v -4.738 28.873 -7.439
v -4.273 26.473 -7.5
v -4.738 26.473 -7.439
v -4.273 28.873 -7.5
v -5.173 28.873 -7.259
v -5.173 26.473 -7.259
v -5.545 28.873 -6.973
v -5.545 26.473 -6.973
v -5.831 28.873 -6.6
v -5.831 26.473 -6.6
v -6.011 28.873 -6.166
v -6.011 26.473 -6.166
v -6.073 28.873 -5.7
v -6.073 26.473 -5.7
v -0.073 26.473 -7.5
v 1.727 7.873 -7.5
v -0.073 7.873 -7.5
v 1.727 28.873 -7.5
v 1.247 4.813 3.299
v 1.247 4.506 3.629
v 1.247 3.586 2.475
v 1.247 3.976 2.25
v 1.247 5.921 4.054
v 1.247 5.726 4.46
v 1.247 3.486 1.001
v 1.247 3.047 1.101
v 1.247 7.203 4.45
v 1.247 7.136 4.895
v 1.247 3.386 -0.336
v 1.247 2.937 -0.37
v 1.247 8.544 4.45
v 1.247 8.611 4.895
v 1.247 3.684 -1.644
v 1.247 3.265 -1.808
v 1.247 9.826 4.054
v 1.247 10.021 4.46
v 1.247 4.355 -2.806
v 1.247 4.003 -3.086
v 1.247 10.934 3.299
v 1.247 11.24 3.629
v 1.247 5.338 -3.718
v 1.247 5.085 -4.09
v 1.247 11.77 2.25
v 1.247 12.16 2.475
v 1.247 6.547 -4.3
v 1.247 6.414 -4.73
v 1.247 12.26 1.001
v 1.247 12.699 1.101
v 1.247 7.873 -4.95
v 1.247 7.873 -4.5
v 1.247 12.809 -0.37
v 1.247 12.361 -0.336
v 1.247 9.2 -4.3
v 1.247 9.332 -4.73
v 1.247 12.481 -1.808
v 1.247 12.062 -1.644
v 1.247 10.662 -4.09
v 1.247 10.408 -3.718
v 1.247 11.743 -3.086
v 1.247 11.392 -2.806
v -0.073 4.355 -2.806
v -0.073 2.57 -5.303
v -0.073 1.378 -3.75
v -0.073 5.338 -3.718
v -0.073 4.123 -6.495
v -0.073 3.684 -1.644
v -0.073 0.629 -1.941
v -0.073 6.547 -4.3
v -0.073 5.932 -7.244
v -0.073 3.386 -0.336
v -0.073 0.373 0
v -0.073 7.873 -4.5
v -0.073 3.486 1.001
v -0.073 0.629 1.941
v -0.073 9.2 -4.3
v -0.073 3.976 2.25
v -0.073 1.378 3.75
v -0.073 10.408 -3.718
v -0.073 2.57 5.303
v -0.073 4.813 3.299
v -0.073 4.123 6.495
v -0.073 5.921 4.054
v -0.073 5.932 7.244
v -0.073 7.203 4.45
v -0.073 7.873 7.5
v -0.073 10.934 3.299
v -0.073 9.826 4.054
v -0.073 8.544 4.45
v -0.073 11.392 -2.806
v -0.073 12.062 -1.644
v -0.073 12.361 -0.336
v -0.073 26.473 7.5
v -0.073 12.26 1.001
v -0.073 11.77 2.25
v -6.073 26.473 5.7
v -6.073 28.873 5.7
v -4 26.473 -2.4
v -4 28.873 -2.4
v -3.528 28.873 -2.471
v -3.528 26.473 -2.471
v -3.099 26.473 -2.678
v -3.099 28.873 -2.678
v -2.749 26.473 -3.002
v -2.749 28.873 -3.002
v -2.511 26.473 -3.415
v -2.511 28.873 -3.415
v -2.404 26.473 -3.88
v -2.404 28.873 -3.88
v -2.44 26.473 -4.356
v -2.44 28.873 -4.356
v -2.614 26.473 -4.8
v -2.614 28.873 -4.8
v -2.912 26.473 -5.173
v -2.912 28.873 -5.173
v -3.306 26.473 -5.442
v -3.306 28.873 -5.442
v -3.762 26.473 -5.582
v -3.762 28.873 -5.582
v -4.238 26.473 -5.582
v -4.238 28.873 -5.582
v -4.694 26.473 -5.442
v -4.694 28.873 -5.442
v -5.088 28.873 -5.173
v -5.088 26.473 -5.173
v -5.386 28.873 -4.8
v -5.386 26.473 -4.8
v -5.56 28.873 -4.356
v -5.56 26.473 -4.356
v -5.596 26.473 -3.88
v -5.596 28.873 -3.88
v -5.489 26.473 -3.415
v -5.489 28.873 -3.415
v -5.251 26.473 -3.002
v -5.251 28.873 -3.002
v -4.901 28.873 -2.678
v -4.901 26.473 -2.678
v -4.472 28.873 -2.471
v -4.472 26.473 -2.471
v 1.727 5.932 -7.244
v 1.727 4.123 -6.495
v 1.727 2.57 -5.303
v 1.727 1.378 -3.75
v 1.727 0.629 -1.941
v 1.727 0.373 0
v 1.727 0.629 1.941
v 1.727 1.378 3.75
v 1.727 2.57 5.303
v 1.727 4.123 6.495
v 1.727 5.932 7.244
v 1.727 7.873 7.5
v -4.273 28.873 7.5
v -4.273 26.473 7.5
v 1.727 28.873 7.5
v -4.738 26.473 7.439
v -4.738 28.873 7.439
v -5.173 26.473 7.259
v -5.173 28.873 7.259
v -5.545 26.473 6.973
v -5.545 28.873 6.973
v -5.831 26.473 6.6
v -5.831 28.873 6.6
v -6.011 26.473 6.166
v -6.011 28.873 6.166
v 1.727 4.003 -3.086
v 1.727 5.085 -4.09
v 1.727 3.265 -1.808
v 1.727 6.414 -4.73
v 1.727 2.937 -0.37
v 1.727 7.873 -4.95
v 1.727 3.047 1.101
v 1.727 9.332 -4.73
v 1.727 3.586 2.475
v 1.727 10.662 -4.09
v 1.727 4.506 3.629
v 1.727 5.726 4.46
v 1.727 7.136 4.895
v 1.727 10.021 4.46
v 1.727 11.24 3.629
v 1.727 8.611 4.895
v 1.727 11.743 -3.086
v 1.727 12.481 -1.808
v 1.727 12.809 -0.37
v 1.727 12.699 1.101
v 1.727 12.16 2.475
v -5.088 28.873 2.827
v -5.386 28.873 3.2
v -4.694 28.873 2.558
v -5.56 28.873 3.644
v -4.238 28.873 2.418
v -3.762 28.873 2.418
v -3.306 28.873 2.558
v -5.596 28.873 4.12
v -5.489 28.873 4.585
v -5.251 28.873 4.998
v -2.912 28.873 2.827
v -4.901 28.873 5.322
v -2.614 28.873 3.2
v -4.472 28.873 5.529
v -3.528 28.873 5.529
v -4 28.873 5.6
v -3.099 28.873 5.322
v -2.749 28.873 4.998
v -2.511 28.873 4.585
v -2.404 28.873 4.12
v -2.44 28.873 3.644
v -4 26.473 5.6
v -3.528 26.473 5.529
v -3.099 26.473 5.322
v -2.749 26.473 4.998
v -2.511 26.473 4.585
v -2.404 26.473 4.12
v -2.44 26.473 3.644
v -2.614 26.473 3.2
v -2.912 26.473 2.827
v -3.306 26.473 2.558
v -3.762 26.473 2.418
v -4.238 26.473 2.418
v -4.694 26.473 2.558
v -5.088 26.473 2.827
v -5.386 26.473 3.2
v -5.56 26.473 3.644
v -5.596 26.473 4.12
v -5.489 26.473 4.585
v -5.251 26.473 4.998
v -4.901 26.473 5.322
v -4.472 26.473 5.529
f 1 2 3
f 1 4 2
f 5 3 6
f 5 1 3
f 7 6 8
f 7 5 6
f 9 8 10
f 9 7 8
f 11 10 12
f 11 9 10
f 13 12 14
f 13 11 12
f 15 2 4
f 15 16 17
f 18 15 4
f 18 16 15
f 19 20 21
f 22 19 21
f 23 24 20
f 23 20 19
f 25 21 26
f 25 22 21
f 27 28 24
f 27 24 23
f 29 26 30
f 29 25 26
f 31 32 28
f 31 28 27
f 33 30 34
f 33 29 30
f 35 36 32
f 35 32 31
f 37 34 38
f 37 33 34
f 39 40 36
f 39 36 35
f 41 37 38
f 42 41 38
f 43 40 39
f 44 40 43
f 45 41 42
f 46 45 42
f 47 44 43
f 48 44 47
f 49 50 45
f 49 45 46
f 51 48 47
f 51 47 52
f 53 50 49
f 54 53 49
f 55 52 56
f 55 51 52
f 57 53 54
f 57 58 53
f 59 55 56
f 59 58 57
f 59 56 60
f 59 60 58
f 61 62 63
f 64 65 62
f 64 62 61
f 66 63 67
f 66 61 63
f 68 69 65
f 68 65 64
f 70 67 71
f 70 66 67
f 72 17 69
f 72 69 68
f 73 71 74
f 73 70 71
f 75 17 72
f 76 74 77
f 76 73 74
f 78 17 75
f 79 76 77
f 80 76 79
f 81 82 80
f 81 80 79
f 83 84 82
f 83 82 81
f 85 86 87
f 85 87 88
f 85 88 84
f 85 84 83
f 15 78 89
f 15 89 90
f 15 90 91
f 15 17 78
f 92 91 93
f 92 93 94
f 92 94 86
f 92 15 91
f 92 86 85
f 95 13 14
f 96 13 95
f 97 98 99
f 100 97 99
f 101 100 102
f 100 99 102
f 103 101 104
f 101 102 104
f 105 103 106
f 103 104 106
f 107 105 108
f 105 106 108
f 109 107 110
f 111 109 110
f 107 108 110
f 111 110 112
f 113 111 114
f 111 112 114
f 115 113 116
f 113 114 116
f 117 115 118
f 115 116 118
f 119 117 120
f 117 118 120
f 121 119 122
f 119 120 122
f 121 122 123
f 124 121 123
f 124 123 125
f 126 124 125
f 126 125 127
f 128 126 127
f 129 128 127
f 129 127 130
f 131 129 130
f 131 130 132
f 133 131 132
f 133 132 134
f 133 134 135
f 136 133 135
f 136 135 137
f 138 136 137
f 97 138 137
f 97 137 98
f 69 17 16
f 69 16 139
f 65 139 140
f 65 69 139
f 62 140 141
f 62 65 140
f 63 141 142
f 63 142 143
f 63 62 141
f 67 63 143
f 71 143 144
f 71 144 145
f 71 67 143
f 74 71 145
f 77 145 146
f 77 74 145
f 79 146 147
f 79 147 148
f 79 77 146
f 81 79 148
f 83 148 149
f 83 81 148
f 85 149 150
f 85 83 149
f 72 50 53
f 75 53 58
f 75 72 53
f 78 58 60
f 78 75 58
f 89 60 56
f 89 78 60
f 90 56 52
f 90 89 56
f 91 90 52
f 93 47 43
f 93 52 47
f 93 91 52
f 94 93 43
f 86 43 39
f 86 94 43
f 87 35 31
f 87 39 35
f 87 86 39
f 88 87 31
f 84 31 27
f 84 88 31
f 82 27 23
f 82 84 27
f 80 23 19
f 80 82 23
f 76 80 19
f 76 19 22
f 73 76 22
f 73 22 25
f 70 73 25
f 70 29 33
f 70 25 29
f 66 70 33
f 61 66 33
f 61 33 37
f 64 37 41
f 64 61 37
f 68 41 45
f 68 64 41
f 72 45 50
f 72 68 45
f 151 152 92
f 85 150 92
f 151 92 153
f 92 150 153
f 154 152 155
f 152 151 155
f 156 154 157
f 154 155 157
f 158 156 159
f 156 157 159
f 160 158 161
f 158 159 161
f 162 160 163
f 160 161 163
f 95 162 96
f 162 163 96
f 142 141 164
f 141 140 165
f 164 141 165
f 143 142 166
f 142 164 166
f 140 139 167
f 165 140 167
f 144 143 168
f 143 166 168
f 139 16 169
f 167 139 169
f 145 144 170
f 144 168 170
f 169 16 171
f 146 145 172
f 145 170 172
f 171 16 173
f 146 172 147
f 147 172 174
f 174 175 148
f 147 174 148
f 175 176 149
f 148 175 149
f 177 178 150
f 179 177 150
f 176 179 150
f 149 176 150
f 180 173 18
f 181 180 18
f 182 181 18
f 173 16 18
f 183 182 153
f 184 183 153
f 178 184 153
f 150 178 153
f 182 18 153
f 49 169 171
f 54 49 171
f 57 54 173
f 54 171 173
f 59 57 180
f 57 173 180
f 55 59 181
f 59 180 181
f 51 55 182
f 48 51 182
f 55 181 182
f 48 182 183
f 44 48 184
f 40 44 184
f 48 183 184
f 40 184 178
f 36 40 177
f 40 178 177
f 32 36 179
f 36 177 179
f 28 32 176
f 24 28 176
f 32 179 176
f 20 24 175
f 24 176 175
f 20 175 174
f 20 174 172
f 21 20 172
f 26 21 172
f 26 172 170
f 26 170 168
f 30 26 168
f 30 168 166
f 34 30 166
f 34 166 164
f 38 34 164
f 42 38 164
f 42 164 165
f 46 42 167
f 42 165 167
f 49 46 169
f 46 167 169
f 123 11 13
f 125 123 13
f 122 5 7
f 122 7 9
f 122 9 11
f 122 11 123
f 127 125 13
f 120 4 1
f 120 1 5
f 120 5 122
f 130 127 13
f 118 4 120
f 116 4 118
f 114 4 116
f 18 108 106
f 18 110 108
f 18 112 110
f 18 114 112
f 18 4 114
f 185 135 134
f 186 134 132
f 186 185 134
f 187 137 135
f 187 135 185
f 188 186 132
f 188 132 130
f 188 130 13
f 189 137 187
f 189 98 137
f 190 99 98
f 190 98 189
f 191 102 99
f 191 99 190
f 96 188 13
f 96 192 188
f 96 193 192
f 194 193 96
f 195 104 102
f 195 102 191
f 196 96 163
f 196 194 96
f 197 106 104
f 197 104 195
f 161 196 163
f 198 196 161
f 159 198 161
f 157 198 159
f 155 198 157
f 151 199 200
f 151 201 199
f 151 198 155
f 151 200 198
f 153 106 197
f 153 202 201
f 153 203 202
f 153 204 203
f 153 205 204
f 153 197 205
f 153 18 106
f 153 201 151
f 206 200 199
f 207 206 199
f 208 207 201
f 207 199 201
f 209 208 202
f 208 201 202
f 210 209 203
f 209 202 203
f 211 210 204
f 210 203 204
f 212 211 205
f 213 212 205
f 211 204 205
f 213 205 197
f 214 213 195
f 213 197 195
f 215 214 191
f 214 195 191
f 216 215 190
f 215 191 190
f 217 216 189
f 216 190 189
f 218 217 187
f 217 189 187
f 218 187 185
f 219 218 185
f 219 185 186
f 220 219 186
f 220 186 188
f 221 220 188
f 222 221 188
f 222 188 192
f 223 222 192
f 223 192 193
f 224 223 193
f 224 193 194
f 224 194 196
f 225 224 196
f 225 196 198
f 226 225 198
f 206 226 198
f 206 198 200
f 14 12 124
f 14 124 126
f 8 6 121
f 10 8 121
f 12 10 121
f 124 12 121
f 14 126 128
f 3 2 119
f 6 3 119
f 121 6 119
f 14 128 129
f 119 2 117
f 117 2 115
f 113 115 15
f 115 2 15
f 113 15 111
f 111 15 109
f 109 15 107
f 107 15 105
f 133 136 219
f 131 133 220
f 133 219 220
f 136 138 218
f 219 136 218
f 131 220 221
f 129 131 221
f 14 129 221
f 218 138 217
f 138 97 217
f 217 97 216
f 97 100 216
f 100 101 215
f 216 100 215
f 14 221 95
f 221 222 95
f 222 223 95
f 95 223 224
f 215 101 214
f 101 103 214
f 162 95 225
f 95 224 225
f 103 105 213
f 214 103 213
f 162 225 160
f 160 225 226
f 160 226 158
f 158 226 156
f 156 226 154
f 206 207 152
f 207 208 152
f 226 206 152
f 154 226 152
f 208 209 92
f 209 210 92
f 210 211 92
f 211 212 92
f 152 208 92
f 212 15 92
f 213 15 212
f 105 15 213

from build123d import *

# Parameters (mm, degrees)
SKETCH_1_R          = 7.5
EXTRUDE_1_DEPTH     = 3
SKETCH_2_W          = 25
SKETCH_2_H          = 4
EXTRUDE_2_DEPTH     = 10
FILLET_1_R          = 3
SKETCH_8_R          = 8.25
CUT_EXTRUDE_2_DEPTH = 0.8
SCALE_1_SCALE       = 0.6
SKETCH_3_R          = 1.6
CUT_EXTRUDE_3_DEPTH = 5


with BuildPart() as part:
    # 草图1 → 凸台-拉伸1 (new body)
    with BuildSketch(Plane(origin=(0, 0, 0), x_dir=(0, 0, -1), z_dir=(1, 0, 0))):
        with BuildLine():
            Line((-12.5, 0), (-12.5, 35))
            Line((-12.5, 35), (12.5, 35))
            Line((12.5, 35), (12.5, 0))
            ThreePointArc((12.5, 0), (0, -12.5), (-12.5, 0))
        make_face()
        Circle(SKETCH_1_R, mode=Mode.SUBTRACT)
    extrude(amount=EXTRUDE_1_DEPTH)

    # 草图2 → 凸台-拉伸2 (add)
    with BuildSketch(Plane.ZY):
        with Locations((0, 33)):
            Rectangle(SKETCH_2_W, SKETCH_2_H)
    extrude(amount=EXTRUDE_2_DEPTH)

    # 圆角1
    fillet_1_edges = [part.edges().sort_by_distance(p)[0] for p in [
        (-10, 33, 12.5),
        (-10, 33, -12.5),
    ]]
    fillet(fillet_1_edges, radius=FILLET_1_R)

    # 草图8 → 切除-拉伸2 (cut)
    with BuildSketch(Plane(origin=(3, 0, 0), x_dir=(0, 0, -1), z_dir=(1, 0, 0))):
        Circle(SKETCH_8_R)
    extrude(amount=-CUT_EXTRUDE_2_DEPTH, mode=Mode.SUBTRACT)


with BuildPart() as part_1:
    # 缩放比例1: scaled about (-0.181266262, 19.683257287, 0)
    add(part.part.scale(SCALE_1_SCALE).moved(Location((-0.072506505, 7.873302915, 0))))

    # 草图3 → 切除-拉伸3 (cut)
    with BuildSketch(Plane(origin=(0, 28.873302915, 0), x_dir=(1, 0, 0), z_dir=(0, 1, 0))):
        with Locations(Location((-4, 4, 0), (0, 0, 270))):
            Circle(SKETCH_3_R)
        with Locations(Location((-4, -4, 0), (0, 0, 270))):
            Circle(SKETCH_3_R)
    extrude(amount=-CUT_EXTRUDE_3_DEPTH, mode=Mode.SUBTRACT)


solid = part_1.part
